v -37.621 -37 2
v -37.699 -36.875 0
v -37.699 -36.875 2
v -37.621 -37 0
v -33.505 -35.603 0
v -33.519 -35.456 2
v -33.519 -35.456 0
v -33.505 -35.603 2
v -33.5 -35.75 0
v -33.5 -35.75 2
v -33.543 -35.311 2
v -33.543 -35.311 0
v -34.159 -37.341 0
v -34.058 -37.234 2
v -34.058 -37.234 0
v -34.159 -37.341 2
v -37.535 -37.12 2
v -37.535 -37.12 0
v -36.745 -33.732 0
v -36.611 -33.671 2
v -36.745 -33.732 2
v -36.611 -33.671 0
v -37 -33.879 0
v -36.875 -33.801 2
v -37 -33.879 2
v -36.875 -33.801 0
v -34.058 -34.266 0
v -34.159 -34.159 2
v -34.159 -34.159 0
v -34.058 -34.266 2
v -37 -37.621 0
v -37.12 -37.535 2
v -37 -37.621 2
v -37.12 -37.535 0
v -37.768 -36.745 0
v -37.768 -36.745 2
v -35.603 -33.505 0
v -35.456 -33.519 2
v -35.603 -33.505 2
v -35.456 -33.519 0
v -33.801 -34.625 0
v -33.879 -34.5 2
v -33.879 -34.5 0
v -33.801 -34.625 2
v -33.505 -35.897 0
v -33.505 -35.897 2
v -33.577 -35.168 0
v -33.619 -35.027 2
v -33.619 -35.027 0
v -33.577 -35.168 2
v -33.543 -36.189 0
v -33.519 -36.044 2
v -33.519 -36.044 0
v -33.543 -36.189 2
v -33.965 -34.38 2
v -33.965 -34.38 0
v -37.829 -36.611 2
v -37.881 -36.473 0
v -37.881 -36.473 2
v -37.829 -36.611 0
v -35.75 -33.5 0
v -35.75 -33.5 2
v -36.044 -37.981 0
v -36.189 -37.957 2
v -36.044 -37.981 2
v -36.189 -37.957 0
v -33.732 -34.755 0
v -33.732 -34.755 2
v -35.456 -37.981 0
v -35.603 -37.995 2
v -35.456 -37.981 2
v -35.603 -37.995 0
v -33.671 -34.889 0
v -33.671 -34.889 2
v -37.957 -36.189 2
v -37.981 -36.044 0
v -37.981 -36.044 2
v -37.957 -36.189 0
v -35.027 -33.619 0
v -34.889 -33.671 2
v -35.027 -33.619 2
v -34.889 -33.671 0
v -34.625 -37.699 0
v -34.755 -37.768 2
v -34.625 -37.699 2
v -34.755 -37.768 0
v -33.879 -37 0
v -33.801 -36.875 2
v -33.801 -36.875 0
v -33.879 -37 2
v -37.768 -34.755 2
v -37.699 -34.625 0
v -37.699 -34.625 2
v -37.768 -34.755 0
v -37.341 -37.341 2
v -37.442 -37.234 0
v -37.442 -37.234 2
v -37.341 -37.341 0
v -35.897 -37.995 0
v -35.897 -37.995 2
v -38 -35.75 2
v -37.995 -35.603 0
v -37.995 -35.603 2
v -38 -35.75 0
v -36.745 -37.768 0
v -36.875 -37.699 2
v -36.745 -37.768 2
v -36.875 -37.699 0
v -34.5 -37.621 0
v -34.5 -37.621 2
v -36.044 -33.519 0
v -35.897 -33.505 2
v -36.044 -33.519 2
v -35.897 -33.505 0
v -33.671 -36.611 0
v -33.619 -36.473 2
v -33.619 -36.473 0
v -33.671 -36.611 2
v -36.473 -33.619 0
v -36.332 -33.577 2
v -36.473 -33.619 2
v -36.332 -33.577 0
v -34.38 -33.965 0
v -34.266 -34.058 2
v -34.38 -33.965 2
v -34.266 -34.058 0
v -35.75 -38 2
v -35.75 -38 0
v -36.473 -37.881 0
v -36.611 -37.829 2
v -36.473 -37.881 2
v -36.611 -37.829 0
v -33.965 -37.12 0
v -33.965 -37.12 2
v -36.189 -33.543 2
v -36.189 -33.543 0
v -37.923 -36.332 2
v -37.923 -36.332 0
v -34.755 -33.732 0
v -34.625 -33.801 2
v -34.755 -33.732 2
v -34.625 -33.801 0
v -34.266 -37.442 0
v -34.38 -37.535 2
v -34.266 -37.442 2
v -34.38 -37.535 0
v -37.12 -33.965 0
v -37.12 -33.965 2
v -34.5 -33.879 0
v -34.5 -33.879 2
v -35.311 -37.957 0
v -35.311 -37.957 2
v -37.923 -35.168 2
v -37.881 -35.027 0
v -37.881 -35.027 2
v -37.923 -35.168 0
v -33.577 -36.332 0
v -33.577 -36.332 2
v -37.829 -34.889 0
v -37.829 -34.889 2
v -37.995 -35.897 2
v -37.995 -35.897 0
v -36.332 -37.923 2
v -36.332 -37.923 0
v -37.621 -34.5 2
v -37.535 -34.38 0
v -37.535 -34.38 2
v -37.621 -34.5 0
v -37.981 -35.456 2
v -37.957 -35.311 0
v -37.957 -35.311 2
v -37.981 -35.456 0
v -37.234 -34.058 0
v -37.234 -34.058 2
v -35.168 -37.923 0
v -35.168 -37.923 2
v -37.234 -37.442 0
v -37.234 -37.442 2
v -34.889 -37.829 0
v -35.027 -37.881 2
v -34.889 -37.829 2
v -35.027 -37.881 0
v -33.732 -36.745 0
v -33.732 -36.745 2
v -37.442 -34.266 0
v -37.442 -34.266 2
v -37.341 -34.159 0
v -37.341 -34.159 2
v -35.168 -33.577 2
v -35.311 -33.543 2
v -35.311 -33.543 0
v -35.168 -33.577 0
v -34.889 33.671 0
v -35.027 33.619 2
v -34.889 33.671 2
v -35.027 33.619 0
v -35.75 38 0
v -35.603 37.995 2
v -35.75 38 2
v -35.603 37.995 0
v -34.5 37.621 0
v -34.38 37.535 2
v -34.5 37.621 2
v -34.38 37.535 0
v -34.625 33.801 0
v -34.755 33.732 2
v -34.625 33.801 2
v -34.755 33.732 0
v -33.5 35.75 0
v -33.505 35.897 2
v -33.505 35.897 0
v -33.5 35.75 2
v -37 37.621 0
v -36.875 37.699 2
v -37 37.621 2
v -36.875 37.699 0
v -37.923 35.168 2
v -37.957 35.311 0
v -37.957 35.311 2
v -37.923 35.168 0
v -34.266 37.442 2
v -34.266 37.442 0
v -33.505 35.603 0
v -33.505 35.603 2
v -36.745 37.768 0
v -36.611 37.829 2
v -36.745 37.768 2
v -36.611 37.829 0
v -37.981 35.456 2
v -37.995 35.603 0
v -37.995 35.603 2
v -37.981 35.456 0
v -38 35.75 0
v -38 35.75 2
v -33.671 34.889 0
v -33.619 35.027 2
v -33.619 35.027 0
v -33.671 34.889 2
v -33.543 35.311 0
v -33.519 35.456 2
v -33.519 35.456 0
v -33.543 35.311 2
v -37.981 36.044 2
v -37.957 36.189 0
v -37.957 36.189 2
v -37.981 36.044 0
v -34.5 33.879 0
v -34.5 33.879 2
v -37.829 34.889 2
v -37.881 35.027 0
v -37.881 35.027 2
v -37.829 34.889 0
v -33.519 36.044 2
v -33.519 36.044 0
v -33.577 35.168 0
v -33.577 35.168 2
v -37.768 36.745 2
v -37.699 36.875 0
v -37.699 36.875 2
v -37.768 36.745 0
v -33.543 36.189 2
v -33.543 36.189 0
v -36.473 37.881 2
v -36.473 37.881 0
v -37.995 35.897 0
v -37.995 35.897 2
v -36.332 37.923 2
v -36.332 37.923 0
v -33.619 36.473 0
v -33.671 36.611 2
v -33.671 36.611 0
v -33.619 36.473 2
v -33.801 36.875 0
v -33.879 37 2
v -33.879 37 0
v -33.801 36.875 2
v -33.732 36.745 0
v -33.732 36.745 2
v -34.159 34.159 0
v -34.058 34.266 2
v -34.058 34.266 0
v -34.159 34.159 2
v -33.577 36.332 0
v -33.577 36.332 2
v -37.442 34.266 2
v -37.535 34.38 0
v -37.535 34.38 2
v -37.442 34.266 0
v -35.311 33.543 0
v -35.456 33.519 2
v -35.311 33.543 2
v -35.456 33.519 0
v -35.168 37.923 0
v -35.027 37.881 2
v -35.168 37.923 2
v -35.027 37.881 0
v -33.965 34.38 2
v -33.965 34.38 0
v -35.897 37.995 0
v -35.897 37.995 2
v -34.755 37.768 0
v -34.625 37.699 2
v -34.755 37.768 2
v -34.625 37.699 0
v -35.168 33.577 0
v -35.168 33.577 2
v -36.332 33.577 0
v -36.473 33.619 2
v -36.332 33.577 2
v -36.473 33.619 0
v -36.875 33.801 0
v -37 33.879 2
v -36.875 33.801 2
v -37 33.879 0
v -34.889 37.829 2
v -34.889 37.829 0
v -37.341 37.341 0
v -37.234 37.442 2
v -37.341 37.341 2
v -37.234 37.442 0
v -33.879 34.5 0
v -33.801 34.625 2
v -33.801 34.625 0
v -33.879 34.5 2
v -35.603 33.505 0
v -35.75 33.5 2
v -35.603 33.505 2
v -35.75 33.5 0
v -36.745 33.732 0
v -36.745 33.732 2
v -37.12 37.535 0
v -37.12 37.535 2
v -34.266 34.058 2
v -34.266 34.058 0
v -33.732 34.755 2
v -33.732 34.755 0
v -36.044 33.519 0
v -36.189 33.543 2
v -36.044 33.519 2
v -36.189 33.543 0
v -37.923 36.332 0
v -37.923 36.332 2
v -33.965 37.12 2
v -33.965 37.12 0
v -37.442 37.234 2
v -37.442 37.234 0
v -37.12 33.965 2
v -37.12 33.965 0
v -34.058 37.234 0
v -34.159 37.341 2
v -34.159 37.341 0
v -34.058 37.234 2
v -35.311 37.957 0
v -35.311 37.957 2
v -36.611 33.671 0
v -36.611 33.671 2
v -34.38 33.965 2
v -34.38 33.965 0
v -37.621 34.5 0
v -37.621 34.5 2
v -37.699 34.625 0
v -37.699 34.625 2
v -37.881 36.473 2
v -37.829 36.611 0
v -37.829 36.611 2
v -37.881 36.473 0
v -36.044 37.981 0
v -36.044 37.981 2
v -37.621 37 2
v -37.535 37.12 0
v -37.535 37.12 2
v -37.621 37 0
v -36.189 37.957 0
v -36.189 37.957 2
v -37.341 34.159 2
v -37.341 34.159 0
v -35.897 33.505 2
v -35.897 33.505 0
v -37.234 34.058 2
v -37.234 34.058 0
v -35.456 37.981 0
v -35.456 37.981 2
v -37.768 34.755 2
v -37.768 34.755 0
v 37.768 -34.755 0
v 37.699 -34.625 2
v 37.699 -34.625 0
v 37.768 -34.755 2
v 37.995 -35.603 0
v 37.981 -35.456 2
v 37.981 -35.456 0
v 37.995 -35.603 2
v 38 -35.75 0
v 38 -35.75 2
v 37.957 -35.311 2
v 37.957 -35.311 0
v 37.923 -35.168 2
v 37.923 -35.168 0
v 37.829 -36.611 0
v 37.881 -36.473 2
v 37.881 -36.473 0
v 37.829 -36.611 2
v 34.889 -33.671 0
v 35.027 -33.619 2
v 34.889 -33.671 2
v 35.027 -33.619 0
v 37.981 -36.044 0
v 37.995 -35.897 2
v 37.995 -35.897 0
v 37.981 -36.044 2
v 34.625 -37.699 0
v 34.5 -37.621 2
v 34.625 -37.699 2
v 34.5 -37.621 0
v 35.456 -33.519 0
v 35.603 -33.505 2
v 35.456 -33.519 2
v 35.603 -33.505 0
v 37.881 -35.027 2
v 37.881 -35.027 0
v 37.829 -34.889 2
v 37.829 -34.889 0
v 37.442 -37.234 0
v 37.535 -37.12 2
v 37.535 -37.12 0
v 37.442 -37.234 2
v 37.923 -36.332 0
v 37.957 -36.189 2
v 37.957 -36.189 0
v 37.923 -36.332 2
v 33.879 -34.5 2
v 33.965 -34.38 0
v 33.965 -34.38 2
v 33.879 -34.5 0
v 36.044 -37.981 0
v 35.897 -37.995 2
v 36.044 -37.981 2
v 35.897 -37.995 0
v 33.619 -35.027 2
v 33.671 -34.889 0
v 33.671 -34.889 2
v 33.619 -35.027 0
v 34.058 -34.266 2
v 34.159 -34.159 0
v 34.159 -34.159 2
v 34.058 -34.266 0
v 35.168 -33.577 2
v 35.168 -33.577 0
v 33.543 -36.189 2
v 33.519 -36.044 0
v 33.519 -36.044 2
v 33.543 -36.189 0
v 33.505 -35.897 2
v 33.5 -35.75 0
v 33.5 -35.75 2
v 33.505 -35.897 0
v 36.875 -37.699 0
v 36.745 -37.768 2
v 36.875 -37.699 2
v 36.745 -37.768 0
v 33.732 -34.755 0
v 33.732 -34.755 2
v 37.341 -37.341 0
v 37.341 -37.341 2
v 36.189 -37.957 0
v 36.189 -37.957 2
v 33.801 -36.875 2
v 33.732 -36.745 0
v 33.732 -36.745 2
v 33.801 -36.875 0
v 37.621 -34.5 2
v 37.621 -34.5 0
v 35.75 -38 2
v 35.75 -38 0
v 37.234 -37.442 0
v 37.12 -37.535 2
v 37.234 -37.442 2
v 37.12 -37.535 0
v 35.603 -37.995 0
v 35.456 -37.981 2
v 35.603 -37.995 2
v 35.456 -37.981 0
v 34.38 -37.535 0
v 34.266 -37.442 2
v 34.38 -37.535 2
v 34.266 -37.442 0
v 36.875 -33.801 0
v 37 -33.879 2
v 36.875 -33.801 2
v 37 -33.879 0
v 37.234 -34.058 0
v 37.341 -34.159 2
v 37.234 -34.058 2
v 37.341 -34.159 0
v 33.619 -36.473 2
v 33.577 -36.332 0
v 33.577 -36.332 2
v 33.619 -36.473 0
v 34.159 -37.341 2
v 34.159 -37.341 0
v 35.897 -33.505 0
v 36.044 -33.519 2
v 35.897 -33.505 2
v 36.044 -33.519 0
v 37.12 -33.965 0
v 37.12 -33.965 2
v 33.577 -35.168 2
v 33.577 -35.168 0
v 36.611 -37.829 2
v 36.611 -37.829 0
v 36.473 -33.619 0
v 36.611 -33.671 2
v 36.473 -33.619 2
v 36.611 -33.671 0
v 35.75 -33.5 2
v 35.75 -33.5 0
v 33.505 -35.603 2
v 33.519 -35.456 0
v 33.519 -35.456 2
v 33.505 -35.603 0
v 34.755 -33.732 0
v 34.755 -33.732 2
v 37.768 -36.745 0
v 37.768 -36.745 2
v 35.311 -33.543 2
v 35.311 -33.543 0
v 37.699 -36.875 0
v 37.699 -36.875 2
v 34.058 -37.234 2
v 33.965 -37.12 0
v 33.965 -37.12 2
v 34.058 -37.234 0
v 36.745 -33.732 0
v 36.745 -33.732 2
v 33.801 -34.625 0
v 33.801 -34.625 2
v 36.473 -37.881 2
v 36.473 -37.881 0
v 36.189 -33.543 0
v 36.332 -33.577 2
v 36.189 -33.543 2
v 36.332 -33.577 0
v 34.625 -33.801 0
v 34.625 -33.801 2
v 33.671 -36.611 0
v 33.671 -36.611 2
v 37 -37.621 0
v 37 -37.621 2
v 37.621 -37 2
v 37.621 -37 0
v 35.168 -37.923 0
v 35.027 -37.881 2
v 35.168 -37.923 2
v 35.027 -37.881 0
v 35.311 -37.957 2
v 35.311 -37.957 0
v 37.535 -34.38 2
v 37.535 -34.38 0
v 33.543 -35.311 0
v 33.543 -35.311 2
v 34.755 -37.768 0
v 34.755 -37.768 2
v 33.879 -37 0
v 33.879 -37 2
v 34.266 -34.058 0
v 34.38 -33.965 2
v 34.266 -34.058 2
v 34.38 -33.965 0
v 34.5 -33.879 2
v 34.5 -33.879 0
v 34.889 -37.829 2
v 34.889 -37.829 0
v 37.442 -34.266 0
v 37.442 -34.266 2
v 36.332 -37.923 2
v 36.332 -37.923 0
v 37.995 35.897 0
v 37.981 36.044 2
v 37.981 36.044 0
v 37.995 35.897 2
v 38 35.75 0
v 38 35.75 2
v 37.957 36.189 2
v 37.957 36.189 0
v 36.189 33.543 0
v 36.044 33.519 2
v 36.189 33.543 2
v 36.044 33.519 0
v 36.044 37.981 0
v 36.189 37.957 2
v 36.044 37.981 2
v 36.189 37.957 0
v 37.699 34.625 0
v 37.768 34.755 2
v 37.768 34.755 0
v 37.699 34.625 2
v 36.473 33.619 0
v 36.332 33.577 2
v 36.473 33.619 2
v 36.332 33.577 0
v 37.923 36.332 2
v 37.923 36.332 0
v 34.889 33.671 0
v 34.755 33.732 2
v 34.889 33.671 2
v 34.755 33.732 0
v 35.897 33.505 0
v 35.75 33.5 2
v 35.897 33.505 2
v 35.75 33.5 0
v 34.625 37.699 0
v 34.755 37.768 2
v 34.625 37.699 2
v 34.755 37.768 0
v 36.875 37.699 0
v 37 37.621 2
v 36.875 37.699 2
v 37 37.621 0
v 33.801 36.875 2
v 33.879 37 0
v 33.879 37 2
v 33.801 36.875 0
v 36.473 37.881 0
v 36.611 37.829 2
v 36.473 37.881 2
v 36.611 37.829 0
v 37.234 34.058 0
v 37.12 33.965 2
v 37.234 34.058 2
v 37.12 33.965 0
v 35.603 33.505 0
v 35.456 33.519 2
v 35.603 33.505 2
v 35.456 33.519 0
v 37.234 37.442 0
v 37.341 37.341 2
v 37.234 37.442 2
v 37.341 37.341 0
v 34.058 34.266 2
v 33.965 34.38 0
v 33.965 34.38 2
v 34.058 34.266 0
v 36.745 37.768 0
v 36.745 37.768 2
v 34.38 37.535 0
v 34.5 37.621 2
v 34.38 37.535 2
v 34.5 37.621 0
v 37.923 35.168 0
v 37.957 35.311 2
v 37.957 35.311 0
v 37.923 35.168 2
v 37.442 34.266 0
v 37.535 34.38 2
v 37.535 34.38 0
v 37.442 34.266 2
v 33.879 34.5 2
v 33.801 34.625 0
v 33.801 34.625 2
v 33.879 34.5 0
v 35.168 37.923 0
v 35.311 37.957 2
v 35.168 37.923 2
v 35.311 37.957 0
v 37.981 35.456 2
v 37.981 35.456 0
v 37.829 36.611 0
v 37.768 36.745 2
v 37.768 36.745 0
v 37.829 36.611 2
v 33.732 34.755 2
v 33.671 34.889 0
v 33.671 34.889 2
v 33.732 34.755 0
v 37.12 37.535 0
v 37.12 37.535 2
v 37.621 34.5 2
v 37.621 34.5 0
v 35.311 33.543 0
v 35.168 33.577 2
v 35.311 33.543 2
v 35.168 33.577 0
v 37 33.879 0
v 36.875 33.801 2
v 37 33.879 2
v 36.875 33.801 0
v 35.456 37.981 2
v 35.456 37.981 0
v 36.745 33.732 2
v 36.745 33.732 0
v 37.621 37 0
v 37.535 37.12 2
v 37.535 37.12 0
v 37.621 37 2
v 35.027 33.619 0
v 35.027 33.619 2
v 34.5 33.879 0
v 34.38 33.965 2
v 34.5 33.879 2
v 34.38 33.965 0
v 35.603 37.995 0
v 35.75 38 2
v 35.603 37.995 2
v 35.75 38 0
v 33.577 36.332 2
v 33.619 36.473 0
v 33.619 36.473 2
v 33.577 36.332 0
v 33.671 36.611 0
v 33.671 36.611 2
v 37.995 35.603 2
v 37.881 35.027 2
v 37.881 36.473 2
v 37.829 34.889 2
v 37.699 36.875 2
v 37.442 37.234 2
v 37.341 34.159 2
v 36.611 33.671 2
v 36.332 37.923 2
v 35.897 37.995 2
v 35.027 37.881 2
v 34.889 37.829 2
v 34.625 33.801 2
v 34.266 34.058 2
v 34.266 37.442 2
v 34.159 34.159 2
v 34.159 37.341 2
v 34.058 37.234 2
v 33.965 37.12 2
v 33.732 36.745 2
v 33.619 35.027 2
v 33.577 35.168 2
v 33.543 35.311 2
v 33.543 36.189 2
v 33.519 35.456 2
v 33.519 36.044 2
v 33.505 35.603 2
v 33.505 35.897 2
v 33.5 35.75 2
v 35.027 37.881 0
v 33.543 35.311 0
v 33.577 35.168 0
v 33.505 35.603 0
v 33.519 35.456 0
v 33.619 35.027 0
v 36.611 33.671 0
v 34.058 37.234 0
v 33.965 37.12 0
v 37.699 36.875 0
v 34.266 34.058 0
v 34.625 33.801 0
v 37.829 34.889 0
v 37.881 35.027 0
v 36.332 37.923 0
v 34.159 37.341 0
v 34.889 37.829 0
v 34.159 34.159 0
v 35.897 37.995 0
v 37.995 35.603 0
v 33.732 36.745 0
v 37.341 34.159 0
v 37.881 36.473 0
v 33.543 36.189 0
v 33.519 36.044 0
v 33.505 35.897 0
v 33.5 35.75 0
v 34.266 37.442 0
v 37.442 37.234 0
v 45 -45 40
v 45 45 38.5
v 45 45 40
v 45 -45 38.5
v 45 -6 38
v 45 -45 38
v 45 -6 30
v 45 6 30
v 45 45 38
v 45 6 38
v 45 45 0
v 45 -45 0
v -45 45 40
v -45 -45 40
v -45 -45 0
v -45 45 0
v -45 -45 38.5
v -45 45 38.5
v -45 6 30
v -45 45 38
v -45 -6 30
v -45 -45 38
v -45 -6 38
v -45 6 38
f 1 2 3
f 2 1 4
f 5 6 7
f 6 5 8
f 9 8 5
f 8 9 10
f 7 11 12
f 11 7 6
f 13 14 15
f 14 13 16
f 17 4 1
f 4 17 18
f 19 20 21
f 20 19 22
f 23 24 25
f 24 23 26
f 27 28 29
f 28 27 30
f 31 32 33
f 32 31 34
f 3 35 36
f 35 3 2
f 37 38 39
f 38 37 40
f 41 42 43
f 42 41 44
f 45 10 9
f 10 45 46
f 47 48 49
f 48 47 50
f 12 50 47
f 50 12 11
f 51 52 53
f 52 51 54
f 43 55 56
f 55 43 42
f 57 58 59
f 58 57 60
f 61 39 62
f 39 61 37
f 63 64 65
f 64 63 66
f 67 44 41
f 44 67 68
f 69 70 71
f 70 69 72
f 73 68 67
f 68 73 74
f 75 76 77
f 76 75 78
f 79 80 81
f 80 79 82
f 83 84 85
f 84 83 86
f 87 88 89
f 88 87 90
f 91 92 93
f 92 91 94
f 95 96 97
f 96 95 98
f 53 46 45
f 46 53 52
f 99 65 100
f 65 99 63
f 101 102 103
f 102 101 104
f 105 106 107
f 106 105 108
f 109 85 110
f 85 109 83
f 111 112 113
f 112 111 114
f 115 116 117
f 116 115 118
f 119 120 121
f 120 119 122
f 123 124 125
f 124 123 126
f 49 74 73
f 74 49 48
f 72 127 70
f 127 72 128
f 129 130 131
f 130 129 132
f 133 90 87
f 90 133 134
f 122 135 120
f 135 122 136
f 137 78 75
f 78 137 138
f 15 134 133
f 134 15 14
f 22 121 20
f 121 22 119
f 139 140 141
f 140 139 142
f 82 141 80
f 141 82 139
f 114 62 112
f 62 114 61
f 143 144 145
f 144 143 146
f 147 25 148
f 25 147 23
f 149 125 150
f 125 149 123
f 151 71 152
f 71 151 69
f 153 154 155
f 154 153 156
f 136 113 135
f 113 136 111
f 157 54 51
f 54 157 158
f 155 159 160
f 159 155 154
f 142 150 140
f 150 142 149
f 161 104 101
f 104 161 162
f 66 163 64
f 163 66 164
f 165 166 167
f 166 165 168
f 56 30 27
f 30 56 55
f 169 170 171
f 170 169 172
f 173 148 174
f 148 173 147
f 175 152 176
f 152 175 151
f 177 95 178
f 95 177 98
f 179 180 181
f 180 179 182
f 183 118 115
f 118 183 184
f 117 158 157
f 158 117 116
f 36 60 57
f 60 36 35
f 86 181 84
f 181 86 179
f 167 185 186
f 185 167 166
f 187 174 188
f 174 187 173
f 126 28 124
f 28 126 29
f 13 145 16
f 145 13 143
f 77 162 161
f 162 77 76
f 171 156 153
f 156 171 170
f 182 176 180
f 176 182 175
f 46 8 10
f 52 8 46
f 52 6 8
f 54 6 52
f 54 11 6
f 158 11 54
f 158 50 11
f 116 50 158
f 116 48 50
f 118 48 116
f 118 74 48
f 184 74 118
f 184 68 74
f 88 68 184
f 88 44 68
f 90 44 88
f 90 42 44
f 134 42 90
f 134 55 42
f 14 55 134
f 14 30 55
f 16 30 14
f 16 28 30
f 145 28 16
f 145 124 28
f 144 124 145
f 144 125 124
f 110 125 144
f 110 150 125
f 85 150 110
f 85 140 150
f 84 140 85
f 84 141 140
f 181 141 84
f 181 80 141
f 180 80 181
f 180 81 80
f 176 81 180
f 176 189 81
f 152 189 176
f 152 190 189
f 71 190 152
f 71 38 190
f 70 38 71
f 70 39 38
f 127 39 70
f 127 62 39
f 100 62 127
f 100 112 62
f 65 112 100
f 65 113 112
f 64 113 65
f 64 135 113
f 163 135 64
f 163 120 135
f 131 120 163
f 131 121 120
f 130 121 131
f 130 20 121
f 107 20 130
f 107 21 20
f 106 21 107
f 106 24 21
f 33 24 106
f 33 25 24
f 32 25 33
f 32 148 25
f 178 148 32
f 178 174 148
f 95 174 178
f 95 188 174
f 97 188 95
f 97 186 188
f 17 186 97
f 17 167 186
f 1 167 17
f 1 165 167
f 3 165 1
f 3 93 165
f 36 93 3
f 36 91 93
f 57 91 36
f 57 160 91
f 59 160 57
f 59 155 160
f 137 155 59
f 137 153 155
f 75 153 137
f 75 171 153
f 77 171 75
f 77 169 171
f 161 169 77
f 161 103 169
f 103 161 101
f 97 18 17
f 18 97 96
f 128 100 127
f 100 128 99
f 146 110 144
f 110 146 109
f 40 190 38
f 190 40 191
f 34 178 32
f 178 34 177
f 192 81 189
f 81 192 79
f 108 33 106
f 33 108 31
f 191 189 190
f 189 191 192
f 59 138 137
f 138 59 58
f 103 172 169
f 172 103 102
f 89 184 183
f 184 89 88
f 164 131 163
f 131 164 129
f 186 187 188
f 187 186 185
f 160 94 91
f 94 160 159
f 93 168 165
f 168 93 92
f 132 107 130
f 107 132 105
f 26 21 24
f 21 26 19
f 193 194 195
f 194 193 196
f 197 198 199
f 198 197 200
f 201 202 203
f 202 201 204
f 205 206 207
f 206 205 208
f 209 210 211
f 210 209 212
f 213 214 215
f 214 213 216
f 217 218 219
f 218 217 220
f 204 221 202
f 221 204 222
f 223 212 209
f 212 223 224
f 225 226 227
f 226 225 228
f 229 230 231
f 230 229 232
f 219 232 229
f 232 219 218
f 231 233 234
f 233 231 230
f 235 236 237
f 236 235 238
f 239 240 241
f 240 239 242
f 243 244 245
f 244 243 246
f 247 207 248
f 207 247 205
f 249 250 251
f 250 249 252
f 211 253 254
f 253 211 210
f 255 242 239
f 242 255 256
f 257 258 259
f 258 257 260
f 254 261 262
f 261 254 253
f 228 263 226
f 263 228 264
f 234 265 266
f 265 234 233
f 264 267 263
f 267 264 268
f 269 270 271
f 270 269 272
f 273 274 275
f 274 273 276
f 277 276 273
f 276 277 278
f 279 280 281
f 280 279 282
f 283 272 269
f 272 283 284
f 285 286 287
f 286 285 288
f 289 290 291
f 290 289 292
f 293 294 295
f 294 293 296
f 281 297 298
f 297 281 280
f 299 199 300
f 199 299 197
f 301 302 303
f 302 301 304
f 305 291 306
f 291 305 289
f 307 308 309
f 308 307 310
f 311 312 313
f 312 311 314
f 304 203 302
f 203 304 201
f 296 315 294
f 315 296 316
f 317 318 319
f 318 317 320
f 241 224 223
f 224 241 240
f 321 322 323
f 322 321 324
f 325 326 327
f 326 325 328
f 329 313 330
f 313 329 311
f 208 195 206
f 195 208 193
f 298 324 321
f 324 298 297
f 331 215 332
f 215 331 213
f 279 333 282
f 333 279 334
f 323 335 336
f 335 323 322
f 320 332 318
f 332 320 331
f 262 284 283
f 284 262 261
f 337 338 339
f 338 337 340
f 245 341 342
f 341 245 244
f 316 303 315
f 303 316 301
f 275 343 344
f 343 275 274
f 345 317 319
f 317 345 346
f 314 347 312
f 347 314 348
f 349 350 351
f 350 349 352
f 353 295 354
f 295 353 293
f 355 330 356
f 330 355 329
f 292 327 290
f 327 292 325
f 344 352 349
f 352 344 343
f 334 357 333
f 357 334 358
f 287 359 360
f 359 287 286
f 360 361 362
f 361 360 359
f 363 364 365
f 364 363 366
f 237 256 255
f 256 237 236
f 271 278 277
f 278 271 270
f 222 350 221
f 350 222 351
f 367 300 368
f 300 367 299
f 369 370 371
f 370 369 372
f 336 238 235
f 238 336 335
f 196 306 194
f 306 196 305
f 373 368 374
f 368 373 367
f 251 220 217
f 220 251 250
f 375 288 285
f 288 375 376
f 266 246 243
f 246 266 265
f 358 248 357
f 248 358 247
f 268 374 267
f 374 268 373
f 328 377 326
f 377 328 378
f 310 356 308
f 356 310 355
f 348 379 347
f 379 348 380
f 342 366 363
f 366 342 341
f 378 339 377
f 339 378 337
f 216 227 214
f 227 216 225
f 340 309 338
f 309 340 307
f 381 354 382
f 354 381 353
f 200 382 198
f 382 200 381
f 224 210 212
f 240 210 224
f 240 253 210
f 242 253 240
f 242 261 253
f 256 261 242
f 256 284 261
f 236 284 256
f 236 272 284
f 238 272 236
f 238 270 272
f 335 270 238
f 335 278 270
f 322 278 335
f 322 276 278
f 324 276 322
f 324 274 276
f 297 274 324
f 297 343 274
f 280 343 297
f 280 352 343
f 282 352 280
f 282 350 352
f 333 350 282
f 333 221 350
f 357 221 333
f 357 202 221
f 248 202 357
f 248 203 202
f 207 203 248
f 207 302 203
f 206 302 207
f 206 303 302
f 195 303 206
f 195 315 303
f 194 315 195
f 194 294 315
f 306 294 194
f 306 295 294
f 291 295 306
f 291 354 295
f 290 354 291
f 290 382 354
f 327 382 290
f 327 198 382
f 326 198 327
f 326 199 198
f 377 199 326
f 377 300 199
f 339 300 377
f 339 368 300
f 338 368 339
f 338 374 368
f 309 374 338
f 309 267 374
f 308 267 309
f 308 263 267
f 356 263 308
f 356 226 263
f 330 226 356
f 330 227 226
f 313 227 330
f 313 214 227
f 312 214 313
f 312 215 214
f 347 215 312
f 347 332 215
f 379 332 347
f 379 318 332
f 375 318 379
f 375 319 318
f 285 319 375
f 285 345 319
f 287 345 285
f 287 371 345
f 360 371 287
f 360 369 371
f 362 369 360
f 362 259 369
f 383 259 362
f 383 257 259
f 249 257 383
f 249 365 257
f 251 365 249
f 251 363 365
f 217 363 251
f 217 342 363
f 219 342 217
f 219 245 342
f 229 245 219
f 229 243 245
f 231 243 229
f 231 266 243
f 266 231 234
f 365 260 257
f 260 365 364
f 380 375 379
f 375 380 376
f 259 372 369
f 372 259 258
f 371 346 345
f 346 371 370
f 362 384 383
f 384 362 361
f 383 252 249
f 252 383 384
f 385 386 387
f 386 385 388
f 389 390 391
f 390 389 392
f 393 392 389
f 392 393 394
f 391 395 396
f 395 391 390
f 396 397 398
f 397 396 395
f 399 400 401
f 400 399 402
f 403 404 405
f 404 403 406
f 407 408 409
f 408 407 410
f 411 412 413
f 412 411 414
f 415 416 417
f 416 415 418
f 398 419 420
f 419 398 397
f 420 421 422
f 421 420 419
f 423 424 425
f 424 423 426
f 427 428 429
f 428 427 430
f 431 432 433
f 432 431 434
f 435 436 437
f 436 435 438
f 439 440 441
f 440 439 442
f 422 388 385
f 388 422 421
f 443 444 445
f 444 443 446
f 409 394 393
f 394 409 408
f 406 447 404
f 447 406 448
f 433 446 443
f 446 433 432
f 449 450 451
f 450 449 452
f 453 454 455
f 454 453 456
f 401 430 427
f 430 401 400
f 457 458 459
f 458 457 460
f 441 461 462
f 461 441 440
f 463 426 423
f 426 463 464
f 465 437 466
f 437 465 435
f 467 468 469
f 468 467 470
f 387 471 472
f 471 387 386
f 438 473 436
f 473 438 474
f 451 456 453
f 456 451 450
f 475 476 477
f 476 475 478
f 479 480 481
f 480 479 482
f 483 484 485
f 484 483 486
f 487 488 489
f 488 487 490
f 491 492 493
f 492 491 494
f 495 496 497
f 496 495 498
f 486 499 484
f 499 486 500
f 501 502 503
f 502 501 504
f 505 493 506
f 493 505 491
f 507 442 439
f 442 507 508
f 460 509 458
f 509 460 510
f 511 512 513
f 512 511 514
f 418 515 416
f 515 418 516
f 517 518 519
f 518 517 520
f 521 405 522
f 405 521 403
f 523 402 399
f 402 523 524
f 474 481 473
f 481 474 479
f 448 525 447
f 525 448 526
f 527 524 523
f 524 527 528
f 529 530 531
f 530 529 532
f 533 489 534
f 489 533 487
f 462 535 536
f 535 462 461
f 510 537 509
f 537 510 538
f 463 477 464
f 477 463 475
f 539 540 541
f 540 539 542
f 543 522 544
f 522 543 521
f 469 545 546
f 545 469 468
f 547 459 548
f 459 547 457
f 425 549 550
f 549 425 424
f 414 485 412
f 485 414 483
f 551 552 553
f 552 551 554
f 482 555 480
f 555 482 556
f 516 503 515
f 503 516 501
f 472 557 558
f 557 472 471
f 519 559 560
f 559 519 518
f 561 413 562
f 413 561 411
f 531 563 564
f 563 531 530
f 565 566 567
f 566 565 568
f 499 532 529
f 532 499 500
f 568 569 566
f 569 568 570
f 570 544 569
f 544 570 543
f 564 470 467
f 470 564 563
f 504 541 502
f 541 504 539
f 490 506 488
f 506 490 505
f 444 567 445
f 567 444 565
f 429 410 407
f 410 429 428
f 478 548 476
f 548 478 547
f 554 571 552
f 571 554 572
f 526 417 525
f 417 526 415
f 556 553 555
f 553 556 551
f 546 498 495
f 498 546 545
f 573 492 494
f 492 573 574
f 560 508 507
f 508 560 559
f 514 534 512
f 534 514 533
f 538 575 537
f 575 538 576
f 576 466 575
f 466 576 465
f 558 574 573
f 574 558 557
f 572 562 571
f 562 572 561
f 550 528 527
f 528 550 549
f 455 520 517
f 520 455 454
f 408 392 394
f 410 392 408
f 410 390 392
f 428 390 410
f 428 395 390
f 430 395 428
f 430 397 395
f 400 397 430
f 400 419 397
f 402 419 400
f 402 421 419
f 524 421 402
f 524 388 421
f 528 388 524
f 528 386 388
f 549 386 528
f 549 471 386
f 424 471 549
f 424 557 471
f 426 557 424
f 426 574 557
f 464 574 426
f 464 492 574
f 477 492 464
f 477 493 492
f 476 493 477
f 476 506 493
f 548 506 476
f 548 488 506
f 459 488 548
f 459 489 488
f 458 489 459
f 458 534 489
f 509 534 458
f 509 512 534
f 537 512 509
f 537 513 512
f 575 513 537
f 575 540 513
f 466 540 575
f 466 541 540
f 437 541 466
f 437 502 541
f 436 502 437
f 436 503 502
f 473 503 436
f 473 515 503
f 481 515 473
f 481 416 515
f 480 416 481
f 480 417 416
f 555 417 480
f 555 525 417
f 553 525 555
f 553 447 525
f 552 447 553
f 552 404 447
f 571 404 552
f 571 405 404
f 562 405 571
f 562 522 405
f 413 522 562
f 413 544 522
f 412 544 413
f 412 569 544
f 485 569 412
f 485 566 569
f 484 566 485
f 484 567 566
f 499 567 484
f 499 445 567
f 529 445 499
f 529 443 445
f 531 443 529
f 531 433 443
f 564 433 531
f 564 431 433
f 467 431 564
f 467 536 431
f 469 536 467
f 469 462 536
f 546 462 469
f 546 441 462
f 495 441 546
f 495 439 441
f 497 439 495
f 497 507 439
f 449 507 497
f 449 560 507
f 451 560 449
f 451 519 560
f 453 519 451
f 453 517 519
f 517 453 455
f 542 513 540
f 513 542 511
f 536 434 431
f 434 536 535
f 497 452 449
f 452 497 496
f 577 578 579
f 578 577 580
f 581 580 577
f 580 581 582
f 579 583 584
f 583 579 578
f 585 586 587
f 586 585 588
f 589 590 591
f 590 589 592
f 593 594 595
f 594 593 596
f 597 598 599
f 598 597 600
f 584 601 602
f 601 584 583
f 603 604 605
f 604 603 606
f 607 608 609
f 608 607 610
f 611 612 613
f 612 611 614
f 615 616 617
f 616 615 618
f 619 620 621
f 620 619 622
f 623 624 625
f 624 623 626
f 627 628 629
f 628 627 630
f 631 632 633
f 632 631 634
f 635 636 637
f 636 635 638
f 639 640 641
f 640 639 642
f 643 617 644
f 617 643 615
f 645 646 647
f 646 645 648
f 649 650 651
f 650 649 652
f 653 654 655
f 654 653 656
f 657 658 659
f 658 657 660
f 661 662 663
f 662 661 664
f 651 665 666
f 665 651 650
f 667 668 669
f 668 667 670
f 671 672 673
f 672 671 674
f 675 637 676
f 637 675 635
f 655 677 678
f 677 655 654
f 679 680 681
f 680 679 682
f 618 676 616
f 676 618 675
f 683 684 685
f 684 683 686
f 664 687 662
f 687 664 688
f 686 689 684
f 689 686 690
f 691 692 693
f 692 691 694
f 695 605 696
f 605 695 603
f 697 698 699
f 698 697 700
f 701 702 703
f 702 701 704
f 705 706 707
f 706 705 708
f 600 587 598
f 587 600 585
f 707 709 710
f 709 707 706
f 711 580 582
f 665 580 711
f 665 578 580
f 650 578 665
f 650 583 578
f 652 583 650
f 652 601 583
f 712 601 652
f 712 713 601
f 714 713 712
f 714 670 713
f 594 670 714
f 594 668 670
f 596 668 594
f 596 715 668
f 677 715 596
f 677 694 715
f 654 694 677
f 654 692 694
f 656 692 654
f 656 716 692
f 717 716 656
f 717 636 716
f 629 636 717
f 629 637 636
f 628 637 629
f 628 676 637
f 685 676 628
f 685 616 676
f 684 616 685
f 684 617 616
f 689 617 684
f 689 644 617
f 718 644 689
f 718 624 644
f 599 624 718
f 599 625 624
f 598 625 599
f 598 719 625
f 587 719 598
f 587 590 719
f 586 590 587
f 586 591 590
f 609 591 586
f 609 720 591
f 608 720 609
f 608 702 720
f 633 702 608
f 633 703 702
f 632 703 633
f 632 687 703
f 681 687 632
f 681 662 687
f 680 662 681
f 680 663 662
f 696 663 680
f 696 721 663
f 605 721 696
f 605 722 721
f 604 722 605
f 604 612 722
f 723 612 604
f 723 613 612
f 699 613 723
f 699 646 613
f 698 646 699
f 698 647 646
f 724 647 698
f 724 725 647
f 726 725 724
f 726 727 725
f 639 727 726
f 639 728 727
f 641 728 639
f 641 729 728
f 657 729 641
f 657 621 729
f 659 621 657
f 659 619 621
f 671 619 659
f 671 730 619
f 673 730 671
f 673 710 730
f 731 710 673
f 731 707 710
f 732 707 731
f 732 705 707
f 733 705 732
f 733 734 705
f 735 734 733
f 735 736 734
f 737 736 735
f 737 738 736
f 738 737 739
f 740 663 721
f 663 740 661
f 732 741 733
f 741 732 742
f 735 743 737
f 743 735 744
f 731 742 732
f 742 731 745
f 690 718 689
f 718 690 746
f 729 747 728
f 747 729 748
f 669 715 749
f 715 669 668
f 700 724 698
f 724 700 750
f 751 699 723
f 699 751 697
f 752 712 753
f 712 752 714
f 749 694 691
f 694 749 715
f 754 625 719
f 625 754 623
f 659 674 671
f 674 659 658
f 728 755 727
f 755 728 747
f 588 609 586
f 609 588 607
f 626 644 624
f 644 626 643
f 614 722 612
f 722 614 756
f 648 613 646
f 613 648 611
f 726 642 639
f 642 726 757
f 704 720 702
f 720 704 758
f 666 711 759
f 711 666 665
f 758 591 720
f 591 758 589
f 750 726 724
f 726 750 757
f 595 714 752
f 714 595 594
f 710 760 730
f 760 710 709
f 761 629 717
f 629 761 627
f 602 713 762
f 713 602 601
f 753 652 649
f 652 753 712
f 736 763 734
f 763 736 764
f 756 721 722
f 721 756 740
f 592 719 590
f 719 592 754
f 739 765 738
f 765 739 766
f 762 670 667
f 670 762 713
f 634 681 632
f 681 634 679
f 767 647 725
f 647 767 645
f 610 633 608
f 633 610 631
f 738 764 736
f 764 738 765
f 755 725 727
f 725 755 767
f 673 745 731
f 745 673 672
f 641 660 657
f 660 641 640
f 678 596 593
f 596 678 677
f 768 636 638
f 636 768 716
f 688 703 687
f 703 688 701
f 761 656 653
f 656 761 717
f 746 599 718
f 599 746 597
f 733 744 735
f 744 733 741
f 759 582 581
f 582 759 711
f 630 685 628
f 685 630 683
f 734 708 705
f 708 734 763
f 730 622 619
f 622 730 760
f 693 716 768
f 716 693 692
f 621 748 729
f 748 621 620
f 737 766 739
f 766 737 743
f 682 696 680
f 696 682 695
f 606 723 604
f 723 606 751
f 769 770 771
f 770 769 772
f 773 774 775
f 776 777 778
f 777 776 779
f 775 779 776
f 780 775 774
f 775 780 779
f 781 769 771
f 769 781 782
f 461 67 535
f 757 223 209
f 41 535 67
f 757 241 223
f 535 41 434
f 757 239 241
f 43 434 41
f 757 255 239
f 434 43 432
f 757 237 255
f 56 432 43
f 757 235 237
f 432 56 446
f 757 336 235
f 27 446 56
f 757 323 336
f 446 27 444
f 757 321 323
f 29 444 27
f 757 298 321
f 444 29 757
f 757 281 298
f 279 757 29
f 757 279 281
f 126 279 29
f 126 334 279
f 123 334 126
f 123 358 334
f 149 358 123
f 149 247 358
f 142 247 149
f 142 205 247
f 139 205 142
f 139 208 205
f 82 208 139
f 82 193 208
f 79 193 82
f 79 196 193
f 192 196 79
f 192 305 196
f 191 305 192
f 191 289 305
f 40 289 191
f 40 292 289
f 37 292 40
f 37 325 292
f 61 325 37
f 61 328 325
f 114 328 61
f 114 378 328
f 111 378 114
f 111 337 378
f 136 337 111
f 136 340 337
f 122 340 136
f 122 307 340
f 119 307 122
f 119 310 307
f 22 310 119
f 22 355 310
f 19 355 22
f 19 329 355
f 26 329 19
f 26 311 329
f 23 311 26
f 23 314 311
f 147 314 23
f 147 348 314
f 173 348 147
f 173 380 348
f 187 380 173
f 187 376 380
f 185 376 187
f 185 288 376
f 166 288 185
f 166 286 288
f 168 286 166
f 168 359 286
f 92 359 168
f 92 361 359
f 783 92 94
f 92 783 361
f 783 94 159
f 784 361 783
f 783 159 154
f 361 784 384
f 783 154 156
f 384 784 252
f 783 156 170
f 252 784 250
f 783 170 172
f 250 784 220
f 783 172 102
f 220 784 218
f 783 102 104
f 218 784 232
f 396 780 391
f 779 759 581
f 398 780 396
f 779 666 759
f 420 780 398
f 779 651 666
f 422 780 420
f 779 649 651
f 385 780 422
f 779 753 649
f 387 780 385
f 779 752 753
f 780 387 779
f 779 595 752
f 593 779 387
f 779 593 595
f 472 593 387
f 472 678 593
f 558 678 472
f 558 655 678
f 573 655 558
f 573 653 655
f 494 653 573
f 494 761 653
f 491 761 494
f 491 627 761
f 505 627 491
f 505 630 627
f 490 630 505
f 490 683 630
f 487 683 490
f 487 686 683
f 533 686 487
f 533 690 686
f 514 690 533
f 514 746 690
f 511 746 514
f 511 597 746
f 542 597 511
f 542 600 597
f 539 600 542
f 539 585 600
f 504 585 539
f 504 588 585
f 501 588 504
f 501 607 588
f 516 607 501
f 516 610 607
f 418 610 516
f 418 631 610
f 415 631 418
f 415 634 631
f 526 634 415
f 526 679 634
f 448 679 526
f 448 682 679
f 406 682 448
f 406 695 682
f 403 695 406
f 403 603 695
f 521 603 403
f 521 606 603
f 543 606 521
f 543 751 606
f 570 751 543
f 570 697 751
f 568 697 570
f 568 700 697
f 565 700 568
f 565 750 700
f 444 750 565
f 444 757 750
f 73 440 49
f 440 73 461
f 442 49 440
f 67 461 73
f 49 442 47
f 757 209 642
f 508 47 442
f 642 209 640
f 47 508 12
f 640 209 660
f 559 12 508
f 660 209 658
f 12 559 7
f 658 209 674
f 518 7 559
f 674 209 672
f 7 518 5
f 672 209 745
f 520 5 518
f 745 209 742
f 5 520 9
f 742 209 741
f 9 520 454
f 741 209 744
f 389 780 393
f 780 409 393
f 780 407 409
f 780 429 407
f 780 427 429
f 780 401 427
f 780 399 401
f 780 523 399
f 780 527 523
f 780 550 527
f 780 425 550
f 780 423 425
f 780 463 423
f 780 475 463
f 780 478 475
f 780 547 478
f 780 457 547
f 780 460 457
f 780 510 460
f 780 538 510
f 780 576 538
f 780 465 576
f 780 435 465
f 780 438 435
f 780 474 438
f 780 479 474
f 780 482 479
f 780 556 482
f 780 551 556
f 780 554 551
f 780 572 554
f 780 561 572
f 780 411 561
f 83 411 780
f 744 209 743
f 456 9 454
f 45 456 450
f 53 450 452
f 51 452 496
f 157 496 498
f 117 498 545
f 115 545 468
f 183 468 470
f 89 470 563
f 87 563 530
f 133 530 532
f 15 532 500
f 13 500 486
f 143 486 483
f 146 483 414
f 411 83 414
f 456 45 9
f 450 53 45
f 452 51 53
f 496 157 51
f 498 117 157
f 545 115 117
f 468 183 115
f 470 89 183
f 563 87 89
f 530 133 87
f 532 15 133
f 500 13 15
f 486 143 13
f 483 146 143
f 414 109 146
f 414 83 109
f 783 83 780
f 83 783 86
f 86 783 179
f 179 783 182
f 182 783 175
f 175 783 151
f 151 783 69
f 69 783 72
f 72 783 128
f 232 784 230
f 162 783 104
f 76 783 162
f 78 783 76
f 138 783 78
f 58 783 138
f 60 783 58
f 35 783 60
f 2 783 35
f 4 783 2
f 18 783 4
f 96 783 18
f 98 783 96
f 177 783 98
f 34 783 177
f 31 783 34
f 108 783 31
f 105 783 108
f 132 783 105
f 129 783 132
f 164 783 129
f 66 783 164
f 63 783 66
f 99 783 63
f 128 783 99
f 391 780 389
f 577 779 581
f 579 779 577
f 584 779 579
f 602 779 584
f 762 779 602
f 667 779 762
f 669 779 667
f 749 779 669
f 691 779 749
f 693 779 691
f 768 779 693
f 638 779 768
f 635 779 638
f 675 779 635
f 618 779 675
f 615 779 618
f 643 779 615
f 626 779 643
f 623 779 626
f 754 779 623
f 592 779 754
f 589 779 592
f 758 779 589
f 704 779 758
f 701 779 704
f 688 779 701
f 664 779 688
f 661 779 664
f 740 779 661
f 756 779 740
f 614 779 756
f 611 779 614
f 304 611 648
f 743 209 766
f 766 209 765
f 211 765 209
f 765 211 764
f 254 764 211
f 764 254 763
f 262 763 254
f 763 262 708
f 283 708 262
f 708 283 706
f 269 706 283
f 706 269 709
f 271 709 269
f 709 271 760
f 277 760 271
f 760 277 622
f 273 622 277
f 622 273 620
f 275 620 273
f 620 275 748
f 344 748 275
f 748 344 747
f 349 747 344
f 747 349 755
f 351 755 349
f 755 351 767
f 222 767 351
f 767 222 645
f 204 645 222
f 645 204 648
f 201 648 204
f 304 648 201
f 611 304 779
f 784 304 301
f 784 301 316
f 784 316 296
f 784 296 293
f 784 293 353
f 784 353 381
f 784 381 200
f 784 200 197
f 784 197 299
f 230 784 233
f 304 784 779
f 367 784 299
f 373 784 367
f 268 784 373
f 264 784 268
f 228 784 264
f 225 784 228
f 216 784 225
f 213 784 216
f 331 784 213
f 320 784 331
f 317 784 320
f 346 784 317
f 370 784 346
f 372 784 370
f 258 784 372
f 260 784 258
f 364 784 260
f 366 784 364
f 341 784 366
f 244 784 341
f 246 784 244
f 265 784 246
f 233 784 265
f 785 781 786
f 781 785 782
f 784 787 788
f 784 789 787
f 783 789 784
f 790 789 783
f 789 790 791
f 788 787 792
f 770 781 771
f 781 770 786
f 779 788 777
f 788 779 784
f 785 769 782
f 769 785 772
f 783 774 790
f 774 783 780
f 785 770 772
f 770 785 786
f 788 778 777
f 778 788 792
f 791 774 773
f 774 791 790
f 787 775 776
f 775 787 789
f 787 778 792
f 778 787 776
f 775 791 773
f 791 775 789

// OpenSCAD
// Magnetic stirrer housing for 80 mm PC case fan
// Print orientation: top plate on bed (z = 0), walls rise to z = 40

// ---------- Parameters ----------
fan_d        = 80;    // fan diameter (mm)
outer_x      = 90;    // outer size in X (mm)
outer_y      = 90;    // outer size in Y (mm)
wall         = 2.5;   // wall thickness (mm)
top_t        = 2;     // top plate thickness (mm)
open_h       = 40 - top_t; // open top height (mm)
screw_d      = 4.5;   // M4 screw hole diameter (mm)
screw_pitch  = 71.5;  // square pattern side for screw holes (mm)
notch_w      = 12;    // cable notch width (mm)
notch_depth  = 8;     // cable notch depth from open edge (mm)
eps          = 0.5;   // cutter overshoot past faces (mm)
$fn          = 96;    // curve resolution

// ---------- Model ----------
difference() {
    // Outer block
    translate([-outer_x/2, -outer_y/2, 0])
        cube([outer_x, outer_y, top_t + open_h]);

    // Open top (through-cut)
    translate([-outer_x/2, -outer_y/2, open_h])
        cube([outer_x, outer_y, eps]);

    // Screw holes in top plate
    for (sx = [-screw_pitch/2, screw_pitch/2])
        for (sy = [-screw_pitch/2, screw_pitch/2])
            translate([sx, sy, -eps])
                cylinder(d = screw_d, h = top_t + eps);

    // Cable notch in one wall (from z = open_h - notch_depth to open_h)
    translate([-outer_x/2, -notch_w/2, open_h - notch_depth])
        cube([outer_x, notch_w, notch_depth + eps]);
}
